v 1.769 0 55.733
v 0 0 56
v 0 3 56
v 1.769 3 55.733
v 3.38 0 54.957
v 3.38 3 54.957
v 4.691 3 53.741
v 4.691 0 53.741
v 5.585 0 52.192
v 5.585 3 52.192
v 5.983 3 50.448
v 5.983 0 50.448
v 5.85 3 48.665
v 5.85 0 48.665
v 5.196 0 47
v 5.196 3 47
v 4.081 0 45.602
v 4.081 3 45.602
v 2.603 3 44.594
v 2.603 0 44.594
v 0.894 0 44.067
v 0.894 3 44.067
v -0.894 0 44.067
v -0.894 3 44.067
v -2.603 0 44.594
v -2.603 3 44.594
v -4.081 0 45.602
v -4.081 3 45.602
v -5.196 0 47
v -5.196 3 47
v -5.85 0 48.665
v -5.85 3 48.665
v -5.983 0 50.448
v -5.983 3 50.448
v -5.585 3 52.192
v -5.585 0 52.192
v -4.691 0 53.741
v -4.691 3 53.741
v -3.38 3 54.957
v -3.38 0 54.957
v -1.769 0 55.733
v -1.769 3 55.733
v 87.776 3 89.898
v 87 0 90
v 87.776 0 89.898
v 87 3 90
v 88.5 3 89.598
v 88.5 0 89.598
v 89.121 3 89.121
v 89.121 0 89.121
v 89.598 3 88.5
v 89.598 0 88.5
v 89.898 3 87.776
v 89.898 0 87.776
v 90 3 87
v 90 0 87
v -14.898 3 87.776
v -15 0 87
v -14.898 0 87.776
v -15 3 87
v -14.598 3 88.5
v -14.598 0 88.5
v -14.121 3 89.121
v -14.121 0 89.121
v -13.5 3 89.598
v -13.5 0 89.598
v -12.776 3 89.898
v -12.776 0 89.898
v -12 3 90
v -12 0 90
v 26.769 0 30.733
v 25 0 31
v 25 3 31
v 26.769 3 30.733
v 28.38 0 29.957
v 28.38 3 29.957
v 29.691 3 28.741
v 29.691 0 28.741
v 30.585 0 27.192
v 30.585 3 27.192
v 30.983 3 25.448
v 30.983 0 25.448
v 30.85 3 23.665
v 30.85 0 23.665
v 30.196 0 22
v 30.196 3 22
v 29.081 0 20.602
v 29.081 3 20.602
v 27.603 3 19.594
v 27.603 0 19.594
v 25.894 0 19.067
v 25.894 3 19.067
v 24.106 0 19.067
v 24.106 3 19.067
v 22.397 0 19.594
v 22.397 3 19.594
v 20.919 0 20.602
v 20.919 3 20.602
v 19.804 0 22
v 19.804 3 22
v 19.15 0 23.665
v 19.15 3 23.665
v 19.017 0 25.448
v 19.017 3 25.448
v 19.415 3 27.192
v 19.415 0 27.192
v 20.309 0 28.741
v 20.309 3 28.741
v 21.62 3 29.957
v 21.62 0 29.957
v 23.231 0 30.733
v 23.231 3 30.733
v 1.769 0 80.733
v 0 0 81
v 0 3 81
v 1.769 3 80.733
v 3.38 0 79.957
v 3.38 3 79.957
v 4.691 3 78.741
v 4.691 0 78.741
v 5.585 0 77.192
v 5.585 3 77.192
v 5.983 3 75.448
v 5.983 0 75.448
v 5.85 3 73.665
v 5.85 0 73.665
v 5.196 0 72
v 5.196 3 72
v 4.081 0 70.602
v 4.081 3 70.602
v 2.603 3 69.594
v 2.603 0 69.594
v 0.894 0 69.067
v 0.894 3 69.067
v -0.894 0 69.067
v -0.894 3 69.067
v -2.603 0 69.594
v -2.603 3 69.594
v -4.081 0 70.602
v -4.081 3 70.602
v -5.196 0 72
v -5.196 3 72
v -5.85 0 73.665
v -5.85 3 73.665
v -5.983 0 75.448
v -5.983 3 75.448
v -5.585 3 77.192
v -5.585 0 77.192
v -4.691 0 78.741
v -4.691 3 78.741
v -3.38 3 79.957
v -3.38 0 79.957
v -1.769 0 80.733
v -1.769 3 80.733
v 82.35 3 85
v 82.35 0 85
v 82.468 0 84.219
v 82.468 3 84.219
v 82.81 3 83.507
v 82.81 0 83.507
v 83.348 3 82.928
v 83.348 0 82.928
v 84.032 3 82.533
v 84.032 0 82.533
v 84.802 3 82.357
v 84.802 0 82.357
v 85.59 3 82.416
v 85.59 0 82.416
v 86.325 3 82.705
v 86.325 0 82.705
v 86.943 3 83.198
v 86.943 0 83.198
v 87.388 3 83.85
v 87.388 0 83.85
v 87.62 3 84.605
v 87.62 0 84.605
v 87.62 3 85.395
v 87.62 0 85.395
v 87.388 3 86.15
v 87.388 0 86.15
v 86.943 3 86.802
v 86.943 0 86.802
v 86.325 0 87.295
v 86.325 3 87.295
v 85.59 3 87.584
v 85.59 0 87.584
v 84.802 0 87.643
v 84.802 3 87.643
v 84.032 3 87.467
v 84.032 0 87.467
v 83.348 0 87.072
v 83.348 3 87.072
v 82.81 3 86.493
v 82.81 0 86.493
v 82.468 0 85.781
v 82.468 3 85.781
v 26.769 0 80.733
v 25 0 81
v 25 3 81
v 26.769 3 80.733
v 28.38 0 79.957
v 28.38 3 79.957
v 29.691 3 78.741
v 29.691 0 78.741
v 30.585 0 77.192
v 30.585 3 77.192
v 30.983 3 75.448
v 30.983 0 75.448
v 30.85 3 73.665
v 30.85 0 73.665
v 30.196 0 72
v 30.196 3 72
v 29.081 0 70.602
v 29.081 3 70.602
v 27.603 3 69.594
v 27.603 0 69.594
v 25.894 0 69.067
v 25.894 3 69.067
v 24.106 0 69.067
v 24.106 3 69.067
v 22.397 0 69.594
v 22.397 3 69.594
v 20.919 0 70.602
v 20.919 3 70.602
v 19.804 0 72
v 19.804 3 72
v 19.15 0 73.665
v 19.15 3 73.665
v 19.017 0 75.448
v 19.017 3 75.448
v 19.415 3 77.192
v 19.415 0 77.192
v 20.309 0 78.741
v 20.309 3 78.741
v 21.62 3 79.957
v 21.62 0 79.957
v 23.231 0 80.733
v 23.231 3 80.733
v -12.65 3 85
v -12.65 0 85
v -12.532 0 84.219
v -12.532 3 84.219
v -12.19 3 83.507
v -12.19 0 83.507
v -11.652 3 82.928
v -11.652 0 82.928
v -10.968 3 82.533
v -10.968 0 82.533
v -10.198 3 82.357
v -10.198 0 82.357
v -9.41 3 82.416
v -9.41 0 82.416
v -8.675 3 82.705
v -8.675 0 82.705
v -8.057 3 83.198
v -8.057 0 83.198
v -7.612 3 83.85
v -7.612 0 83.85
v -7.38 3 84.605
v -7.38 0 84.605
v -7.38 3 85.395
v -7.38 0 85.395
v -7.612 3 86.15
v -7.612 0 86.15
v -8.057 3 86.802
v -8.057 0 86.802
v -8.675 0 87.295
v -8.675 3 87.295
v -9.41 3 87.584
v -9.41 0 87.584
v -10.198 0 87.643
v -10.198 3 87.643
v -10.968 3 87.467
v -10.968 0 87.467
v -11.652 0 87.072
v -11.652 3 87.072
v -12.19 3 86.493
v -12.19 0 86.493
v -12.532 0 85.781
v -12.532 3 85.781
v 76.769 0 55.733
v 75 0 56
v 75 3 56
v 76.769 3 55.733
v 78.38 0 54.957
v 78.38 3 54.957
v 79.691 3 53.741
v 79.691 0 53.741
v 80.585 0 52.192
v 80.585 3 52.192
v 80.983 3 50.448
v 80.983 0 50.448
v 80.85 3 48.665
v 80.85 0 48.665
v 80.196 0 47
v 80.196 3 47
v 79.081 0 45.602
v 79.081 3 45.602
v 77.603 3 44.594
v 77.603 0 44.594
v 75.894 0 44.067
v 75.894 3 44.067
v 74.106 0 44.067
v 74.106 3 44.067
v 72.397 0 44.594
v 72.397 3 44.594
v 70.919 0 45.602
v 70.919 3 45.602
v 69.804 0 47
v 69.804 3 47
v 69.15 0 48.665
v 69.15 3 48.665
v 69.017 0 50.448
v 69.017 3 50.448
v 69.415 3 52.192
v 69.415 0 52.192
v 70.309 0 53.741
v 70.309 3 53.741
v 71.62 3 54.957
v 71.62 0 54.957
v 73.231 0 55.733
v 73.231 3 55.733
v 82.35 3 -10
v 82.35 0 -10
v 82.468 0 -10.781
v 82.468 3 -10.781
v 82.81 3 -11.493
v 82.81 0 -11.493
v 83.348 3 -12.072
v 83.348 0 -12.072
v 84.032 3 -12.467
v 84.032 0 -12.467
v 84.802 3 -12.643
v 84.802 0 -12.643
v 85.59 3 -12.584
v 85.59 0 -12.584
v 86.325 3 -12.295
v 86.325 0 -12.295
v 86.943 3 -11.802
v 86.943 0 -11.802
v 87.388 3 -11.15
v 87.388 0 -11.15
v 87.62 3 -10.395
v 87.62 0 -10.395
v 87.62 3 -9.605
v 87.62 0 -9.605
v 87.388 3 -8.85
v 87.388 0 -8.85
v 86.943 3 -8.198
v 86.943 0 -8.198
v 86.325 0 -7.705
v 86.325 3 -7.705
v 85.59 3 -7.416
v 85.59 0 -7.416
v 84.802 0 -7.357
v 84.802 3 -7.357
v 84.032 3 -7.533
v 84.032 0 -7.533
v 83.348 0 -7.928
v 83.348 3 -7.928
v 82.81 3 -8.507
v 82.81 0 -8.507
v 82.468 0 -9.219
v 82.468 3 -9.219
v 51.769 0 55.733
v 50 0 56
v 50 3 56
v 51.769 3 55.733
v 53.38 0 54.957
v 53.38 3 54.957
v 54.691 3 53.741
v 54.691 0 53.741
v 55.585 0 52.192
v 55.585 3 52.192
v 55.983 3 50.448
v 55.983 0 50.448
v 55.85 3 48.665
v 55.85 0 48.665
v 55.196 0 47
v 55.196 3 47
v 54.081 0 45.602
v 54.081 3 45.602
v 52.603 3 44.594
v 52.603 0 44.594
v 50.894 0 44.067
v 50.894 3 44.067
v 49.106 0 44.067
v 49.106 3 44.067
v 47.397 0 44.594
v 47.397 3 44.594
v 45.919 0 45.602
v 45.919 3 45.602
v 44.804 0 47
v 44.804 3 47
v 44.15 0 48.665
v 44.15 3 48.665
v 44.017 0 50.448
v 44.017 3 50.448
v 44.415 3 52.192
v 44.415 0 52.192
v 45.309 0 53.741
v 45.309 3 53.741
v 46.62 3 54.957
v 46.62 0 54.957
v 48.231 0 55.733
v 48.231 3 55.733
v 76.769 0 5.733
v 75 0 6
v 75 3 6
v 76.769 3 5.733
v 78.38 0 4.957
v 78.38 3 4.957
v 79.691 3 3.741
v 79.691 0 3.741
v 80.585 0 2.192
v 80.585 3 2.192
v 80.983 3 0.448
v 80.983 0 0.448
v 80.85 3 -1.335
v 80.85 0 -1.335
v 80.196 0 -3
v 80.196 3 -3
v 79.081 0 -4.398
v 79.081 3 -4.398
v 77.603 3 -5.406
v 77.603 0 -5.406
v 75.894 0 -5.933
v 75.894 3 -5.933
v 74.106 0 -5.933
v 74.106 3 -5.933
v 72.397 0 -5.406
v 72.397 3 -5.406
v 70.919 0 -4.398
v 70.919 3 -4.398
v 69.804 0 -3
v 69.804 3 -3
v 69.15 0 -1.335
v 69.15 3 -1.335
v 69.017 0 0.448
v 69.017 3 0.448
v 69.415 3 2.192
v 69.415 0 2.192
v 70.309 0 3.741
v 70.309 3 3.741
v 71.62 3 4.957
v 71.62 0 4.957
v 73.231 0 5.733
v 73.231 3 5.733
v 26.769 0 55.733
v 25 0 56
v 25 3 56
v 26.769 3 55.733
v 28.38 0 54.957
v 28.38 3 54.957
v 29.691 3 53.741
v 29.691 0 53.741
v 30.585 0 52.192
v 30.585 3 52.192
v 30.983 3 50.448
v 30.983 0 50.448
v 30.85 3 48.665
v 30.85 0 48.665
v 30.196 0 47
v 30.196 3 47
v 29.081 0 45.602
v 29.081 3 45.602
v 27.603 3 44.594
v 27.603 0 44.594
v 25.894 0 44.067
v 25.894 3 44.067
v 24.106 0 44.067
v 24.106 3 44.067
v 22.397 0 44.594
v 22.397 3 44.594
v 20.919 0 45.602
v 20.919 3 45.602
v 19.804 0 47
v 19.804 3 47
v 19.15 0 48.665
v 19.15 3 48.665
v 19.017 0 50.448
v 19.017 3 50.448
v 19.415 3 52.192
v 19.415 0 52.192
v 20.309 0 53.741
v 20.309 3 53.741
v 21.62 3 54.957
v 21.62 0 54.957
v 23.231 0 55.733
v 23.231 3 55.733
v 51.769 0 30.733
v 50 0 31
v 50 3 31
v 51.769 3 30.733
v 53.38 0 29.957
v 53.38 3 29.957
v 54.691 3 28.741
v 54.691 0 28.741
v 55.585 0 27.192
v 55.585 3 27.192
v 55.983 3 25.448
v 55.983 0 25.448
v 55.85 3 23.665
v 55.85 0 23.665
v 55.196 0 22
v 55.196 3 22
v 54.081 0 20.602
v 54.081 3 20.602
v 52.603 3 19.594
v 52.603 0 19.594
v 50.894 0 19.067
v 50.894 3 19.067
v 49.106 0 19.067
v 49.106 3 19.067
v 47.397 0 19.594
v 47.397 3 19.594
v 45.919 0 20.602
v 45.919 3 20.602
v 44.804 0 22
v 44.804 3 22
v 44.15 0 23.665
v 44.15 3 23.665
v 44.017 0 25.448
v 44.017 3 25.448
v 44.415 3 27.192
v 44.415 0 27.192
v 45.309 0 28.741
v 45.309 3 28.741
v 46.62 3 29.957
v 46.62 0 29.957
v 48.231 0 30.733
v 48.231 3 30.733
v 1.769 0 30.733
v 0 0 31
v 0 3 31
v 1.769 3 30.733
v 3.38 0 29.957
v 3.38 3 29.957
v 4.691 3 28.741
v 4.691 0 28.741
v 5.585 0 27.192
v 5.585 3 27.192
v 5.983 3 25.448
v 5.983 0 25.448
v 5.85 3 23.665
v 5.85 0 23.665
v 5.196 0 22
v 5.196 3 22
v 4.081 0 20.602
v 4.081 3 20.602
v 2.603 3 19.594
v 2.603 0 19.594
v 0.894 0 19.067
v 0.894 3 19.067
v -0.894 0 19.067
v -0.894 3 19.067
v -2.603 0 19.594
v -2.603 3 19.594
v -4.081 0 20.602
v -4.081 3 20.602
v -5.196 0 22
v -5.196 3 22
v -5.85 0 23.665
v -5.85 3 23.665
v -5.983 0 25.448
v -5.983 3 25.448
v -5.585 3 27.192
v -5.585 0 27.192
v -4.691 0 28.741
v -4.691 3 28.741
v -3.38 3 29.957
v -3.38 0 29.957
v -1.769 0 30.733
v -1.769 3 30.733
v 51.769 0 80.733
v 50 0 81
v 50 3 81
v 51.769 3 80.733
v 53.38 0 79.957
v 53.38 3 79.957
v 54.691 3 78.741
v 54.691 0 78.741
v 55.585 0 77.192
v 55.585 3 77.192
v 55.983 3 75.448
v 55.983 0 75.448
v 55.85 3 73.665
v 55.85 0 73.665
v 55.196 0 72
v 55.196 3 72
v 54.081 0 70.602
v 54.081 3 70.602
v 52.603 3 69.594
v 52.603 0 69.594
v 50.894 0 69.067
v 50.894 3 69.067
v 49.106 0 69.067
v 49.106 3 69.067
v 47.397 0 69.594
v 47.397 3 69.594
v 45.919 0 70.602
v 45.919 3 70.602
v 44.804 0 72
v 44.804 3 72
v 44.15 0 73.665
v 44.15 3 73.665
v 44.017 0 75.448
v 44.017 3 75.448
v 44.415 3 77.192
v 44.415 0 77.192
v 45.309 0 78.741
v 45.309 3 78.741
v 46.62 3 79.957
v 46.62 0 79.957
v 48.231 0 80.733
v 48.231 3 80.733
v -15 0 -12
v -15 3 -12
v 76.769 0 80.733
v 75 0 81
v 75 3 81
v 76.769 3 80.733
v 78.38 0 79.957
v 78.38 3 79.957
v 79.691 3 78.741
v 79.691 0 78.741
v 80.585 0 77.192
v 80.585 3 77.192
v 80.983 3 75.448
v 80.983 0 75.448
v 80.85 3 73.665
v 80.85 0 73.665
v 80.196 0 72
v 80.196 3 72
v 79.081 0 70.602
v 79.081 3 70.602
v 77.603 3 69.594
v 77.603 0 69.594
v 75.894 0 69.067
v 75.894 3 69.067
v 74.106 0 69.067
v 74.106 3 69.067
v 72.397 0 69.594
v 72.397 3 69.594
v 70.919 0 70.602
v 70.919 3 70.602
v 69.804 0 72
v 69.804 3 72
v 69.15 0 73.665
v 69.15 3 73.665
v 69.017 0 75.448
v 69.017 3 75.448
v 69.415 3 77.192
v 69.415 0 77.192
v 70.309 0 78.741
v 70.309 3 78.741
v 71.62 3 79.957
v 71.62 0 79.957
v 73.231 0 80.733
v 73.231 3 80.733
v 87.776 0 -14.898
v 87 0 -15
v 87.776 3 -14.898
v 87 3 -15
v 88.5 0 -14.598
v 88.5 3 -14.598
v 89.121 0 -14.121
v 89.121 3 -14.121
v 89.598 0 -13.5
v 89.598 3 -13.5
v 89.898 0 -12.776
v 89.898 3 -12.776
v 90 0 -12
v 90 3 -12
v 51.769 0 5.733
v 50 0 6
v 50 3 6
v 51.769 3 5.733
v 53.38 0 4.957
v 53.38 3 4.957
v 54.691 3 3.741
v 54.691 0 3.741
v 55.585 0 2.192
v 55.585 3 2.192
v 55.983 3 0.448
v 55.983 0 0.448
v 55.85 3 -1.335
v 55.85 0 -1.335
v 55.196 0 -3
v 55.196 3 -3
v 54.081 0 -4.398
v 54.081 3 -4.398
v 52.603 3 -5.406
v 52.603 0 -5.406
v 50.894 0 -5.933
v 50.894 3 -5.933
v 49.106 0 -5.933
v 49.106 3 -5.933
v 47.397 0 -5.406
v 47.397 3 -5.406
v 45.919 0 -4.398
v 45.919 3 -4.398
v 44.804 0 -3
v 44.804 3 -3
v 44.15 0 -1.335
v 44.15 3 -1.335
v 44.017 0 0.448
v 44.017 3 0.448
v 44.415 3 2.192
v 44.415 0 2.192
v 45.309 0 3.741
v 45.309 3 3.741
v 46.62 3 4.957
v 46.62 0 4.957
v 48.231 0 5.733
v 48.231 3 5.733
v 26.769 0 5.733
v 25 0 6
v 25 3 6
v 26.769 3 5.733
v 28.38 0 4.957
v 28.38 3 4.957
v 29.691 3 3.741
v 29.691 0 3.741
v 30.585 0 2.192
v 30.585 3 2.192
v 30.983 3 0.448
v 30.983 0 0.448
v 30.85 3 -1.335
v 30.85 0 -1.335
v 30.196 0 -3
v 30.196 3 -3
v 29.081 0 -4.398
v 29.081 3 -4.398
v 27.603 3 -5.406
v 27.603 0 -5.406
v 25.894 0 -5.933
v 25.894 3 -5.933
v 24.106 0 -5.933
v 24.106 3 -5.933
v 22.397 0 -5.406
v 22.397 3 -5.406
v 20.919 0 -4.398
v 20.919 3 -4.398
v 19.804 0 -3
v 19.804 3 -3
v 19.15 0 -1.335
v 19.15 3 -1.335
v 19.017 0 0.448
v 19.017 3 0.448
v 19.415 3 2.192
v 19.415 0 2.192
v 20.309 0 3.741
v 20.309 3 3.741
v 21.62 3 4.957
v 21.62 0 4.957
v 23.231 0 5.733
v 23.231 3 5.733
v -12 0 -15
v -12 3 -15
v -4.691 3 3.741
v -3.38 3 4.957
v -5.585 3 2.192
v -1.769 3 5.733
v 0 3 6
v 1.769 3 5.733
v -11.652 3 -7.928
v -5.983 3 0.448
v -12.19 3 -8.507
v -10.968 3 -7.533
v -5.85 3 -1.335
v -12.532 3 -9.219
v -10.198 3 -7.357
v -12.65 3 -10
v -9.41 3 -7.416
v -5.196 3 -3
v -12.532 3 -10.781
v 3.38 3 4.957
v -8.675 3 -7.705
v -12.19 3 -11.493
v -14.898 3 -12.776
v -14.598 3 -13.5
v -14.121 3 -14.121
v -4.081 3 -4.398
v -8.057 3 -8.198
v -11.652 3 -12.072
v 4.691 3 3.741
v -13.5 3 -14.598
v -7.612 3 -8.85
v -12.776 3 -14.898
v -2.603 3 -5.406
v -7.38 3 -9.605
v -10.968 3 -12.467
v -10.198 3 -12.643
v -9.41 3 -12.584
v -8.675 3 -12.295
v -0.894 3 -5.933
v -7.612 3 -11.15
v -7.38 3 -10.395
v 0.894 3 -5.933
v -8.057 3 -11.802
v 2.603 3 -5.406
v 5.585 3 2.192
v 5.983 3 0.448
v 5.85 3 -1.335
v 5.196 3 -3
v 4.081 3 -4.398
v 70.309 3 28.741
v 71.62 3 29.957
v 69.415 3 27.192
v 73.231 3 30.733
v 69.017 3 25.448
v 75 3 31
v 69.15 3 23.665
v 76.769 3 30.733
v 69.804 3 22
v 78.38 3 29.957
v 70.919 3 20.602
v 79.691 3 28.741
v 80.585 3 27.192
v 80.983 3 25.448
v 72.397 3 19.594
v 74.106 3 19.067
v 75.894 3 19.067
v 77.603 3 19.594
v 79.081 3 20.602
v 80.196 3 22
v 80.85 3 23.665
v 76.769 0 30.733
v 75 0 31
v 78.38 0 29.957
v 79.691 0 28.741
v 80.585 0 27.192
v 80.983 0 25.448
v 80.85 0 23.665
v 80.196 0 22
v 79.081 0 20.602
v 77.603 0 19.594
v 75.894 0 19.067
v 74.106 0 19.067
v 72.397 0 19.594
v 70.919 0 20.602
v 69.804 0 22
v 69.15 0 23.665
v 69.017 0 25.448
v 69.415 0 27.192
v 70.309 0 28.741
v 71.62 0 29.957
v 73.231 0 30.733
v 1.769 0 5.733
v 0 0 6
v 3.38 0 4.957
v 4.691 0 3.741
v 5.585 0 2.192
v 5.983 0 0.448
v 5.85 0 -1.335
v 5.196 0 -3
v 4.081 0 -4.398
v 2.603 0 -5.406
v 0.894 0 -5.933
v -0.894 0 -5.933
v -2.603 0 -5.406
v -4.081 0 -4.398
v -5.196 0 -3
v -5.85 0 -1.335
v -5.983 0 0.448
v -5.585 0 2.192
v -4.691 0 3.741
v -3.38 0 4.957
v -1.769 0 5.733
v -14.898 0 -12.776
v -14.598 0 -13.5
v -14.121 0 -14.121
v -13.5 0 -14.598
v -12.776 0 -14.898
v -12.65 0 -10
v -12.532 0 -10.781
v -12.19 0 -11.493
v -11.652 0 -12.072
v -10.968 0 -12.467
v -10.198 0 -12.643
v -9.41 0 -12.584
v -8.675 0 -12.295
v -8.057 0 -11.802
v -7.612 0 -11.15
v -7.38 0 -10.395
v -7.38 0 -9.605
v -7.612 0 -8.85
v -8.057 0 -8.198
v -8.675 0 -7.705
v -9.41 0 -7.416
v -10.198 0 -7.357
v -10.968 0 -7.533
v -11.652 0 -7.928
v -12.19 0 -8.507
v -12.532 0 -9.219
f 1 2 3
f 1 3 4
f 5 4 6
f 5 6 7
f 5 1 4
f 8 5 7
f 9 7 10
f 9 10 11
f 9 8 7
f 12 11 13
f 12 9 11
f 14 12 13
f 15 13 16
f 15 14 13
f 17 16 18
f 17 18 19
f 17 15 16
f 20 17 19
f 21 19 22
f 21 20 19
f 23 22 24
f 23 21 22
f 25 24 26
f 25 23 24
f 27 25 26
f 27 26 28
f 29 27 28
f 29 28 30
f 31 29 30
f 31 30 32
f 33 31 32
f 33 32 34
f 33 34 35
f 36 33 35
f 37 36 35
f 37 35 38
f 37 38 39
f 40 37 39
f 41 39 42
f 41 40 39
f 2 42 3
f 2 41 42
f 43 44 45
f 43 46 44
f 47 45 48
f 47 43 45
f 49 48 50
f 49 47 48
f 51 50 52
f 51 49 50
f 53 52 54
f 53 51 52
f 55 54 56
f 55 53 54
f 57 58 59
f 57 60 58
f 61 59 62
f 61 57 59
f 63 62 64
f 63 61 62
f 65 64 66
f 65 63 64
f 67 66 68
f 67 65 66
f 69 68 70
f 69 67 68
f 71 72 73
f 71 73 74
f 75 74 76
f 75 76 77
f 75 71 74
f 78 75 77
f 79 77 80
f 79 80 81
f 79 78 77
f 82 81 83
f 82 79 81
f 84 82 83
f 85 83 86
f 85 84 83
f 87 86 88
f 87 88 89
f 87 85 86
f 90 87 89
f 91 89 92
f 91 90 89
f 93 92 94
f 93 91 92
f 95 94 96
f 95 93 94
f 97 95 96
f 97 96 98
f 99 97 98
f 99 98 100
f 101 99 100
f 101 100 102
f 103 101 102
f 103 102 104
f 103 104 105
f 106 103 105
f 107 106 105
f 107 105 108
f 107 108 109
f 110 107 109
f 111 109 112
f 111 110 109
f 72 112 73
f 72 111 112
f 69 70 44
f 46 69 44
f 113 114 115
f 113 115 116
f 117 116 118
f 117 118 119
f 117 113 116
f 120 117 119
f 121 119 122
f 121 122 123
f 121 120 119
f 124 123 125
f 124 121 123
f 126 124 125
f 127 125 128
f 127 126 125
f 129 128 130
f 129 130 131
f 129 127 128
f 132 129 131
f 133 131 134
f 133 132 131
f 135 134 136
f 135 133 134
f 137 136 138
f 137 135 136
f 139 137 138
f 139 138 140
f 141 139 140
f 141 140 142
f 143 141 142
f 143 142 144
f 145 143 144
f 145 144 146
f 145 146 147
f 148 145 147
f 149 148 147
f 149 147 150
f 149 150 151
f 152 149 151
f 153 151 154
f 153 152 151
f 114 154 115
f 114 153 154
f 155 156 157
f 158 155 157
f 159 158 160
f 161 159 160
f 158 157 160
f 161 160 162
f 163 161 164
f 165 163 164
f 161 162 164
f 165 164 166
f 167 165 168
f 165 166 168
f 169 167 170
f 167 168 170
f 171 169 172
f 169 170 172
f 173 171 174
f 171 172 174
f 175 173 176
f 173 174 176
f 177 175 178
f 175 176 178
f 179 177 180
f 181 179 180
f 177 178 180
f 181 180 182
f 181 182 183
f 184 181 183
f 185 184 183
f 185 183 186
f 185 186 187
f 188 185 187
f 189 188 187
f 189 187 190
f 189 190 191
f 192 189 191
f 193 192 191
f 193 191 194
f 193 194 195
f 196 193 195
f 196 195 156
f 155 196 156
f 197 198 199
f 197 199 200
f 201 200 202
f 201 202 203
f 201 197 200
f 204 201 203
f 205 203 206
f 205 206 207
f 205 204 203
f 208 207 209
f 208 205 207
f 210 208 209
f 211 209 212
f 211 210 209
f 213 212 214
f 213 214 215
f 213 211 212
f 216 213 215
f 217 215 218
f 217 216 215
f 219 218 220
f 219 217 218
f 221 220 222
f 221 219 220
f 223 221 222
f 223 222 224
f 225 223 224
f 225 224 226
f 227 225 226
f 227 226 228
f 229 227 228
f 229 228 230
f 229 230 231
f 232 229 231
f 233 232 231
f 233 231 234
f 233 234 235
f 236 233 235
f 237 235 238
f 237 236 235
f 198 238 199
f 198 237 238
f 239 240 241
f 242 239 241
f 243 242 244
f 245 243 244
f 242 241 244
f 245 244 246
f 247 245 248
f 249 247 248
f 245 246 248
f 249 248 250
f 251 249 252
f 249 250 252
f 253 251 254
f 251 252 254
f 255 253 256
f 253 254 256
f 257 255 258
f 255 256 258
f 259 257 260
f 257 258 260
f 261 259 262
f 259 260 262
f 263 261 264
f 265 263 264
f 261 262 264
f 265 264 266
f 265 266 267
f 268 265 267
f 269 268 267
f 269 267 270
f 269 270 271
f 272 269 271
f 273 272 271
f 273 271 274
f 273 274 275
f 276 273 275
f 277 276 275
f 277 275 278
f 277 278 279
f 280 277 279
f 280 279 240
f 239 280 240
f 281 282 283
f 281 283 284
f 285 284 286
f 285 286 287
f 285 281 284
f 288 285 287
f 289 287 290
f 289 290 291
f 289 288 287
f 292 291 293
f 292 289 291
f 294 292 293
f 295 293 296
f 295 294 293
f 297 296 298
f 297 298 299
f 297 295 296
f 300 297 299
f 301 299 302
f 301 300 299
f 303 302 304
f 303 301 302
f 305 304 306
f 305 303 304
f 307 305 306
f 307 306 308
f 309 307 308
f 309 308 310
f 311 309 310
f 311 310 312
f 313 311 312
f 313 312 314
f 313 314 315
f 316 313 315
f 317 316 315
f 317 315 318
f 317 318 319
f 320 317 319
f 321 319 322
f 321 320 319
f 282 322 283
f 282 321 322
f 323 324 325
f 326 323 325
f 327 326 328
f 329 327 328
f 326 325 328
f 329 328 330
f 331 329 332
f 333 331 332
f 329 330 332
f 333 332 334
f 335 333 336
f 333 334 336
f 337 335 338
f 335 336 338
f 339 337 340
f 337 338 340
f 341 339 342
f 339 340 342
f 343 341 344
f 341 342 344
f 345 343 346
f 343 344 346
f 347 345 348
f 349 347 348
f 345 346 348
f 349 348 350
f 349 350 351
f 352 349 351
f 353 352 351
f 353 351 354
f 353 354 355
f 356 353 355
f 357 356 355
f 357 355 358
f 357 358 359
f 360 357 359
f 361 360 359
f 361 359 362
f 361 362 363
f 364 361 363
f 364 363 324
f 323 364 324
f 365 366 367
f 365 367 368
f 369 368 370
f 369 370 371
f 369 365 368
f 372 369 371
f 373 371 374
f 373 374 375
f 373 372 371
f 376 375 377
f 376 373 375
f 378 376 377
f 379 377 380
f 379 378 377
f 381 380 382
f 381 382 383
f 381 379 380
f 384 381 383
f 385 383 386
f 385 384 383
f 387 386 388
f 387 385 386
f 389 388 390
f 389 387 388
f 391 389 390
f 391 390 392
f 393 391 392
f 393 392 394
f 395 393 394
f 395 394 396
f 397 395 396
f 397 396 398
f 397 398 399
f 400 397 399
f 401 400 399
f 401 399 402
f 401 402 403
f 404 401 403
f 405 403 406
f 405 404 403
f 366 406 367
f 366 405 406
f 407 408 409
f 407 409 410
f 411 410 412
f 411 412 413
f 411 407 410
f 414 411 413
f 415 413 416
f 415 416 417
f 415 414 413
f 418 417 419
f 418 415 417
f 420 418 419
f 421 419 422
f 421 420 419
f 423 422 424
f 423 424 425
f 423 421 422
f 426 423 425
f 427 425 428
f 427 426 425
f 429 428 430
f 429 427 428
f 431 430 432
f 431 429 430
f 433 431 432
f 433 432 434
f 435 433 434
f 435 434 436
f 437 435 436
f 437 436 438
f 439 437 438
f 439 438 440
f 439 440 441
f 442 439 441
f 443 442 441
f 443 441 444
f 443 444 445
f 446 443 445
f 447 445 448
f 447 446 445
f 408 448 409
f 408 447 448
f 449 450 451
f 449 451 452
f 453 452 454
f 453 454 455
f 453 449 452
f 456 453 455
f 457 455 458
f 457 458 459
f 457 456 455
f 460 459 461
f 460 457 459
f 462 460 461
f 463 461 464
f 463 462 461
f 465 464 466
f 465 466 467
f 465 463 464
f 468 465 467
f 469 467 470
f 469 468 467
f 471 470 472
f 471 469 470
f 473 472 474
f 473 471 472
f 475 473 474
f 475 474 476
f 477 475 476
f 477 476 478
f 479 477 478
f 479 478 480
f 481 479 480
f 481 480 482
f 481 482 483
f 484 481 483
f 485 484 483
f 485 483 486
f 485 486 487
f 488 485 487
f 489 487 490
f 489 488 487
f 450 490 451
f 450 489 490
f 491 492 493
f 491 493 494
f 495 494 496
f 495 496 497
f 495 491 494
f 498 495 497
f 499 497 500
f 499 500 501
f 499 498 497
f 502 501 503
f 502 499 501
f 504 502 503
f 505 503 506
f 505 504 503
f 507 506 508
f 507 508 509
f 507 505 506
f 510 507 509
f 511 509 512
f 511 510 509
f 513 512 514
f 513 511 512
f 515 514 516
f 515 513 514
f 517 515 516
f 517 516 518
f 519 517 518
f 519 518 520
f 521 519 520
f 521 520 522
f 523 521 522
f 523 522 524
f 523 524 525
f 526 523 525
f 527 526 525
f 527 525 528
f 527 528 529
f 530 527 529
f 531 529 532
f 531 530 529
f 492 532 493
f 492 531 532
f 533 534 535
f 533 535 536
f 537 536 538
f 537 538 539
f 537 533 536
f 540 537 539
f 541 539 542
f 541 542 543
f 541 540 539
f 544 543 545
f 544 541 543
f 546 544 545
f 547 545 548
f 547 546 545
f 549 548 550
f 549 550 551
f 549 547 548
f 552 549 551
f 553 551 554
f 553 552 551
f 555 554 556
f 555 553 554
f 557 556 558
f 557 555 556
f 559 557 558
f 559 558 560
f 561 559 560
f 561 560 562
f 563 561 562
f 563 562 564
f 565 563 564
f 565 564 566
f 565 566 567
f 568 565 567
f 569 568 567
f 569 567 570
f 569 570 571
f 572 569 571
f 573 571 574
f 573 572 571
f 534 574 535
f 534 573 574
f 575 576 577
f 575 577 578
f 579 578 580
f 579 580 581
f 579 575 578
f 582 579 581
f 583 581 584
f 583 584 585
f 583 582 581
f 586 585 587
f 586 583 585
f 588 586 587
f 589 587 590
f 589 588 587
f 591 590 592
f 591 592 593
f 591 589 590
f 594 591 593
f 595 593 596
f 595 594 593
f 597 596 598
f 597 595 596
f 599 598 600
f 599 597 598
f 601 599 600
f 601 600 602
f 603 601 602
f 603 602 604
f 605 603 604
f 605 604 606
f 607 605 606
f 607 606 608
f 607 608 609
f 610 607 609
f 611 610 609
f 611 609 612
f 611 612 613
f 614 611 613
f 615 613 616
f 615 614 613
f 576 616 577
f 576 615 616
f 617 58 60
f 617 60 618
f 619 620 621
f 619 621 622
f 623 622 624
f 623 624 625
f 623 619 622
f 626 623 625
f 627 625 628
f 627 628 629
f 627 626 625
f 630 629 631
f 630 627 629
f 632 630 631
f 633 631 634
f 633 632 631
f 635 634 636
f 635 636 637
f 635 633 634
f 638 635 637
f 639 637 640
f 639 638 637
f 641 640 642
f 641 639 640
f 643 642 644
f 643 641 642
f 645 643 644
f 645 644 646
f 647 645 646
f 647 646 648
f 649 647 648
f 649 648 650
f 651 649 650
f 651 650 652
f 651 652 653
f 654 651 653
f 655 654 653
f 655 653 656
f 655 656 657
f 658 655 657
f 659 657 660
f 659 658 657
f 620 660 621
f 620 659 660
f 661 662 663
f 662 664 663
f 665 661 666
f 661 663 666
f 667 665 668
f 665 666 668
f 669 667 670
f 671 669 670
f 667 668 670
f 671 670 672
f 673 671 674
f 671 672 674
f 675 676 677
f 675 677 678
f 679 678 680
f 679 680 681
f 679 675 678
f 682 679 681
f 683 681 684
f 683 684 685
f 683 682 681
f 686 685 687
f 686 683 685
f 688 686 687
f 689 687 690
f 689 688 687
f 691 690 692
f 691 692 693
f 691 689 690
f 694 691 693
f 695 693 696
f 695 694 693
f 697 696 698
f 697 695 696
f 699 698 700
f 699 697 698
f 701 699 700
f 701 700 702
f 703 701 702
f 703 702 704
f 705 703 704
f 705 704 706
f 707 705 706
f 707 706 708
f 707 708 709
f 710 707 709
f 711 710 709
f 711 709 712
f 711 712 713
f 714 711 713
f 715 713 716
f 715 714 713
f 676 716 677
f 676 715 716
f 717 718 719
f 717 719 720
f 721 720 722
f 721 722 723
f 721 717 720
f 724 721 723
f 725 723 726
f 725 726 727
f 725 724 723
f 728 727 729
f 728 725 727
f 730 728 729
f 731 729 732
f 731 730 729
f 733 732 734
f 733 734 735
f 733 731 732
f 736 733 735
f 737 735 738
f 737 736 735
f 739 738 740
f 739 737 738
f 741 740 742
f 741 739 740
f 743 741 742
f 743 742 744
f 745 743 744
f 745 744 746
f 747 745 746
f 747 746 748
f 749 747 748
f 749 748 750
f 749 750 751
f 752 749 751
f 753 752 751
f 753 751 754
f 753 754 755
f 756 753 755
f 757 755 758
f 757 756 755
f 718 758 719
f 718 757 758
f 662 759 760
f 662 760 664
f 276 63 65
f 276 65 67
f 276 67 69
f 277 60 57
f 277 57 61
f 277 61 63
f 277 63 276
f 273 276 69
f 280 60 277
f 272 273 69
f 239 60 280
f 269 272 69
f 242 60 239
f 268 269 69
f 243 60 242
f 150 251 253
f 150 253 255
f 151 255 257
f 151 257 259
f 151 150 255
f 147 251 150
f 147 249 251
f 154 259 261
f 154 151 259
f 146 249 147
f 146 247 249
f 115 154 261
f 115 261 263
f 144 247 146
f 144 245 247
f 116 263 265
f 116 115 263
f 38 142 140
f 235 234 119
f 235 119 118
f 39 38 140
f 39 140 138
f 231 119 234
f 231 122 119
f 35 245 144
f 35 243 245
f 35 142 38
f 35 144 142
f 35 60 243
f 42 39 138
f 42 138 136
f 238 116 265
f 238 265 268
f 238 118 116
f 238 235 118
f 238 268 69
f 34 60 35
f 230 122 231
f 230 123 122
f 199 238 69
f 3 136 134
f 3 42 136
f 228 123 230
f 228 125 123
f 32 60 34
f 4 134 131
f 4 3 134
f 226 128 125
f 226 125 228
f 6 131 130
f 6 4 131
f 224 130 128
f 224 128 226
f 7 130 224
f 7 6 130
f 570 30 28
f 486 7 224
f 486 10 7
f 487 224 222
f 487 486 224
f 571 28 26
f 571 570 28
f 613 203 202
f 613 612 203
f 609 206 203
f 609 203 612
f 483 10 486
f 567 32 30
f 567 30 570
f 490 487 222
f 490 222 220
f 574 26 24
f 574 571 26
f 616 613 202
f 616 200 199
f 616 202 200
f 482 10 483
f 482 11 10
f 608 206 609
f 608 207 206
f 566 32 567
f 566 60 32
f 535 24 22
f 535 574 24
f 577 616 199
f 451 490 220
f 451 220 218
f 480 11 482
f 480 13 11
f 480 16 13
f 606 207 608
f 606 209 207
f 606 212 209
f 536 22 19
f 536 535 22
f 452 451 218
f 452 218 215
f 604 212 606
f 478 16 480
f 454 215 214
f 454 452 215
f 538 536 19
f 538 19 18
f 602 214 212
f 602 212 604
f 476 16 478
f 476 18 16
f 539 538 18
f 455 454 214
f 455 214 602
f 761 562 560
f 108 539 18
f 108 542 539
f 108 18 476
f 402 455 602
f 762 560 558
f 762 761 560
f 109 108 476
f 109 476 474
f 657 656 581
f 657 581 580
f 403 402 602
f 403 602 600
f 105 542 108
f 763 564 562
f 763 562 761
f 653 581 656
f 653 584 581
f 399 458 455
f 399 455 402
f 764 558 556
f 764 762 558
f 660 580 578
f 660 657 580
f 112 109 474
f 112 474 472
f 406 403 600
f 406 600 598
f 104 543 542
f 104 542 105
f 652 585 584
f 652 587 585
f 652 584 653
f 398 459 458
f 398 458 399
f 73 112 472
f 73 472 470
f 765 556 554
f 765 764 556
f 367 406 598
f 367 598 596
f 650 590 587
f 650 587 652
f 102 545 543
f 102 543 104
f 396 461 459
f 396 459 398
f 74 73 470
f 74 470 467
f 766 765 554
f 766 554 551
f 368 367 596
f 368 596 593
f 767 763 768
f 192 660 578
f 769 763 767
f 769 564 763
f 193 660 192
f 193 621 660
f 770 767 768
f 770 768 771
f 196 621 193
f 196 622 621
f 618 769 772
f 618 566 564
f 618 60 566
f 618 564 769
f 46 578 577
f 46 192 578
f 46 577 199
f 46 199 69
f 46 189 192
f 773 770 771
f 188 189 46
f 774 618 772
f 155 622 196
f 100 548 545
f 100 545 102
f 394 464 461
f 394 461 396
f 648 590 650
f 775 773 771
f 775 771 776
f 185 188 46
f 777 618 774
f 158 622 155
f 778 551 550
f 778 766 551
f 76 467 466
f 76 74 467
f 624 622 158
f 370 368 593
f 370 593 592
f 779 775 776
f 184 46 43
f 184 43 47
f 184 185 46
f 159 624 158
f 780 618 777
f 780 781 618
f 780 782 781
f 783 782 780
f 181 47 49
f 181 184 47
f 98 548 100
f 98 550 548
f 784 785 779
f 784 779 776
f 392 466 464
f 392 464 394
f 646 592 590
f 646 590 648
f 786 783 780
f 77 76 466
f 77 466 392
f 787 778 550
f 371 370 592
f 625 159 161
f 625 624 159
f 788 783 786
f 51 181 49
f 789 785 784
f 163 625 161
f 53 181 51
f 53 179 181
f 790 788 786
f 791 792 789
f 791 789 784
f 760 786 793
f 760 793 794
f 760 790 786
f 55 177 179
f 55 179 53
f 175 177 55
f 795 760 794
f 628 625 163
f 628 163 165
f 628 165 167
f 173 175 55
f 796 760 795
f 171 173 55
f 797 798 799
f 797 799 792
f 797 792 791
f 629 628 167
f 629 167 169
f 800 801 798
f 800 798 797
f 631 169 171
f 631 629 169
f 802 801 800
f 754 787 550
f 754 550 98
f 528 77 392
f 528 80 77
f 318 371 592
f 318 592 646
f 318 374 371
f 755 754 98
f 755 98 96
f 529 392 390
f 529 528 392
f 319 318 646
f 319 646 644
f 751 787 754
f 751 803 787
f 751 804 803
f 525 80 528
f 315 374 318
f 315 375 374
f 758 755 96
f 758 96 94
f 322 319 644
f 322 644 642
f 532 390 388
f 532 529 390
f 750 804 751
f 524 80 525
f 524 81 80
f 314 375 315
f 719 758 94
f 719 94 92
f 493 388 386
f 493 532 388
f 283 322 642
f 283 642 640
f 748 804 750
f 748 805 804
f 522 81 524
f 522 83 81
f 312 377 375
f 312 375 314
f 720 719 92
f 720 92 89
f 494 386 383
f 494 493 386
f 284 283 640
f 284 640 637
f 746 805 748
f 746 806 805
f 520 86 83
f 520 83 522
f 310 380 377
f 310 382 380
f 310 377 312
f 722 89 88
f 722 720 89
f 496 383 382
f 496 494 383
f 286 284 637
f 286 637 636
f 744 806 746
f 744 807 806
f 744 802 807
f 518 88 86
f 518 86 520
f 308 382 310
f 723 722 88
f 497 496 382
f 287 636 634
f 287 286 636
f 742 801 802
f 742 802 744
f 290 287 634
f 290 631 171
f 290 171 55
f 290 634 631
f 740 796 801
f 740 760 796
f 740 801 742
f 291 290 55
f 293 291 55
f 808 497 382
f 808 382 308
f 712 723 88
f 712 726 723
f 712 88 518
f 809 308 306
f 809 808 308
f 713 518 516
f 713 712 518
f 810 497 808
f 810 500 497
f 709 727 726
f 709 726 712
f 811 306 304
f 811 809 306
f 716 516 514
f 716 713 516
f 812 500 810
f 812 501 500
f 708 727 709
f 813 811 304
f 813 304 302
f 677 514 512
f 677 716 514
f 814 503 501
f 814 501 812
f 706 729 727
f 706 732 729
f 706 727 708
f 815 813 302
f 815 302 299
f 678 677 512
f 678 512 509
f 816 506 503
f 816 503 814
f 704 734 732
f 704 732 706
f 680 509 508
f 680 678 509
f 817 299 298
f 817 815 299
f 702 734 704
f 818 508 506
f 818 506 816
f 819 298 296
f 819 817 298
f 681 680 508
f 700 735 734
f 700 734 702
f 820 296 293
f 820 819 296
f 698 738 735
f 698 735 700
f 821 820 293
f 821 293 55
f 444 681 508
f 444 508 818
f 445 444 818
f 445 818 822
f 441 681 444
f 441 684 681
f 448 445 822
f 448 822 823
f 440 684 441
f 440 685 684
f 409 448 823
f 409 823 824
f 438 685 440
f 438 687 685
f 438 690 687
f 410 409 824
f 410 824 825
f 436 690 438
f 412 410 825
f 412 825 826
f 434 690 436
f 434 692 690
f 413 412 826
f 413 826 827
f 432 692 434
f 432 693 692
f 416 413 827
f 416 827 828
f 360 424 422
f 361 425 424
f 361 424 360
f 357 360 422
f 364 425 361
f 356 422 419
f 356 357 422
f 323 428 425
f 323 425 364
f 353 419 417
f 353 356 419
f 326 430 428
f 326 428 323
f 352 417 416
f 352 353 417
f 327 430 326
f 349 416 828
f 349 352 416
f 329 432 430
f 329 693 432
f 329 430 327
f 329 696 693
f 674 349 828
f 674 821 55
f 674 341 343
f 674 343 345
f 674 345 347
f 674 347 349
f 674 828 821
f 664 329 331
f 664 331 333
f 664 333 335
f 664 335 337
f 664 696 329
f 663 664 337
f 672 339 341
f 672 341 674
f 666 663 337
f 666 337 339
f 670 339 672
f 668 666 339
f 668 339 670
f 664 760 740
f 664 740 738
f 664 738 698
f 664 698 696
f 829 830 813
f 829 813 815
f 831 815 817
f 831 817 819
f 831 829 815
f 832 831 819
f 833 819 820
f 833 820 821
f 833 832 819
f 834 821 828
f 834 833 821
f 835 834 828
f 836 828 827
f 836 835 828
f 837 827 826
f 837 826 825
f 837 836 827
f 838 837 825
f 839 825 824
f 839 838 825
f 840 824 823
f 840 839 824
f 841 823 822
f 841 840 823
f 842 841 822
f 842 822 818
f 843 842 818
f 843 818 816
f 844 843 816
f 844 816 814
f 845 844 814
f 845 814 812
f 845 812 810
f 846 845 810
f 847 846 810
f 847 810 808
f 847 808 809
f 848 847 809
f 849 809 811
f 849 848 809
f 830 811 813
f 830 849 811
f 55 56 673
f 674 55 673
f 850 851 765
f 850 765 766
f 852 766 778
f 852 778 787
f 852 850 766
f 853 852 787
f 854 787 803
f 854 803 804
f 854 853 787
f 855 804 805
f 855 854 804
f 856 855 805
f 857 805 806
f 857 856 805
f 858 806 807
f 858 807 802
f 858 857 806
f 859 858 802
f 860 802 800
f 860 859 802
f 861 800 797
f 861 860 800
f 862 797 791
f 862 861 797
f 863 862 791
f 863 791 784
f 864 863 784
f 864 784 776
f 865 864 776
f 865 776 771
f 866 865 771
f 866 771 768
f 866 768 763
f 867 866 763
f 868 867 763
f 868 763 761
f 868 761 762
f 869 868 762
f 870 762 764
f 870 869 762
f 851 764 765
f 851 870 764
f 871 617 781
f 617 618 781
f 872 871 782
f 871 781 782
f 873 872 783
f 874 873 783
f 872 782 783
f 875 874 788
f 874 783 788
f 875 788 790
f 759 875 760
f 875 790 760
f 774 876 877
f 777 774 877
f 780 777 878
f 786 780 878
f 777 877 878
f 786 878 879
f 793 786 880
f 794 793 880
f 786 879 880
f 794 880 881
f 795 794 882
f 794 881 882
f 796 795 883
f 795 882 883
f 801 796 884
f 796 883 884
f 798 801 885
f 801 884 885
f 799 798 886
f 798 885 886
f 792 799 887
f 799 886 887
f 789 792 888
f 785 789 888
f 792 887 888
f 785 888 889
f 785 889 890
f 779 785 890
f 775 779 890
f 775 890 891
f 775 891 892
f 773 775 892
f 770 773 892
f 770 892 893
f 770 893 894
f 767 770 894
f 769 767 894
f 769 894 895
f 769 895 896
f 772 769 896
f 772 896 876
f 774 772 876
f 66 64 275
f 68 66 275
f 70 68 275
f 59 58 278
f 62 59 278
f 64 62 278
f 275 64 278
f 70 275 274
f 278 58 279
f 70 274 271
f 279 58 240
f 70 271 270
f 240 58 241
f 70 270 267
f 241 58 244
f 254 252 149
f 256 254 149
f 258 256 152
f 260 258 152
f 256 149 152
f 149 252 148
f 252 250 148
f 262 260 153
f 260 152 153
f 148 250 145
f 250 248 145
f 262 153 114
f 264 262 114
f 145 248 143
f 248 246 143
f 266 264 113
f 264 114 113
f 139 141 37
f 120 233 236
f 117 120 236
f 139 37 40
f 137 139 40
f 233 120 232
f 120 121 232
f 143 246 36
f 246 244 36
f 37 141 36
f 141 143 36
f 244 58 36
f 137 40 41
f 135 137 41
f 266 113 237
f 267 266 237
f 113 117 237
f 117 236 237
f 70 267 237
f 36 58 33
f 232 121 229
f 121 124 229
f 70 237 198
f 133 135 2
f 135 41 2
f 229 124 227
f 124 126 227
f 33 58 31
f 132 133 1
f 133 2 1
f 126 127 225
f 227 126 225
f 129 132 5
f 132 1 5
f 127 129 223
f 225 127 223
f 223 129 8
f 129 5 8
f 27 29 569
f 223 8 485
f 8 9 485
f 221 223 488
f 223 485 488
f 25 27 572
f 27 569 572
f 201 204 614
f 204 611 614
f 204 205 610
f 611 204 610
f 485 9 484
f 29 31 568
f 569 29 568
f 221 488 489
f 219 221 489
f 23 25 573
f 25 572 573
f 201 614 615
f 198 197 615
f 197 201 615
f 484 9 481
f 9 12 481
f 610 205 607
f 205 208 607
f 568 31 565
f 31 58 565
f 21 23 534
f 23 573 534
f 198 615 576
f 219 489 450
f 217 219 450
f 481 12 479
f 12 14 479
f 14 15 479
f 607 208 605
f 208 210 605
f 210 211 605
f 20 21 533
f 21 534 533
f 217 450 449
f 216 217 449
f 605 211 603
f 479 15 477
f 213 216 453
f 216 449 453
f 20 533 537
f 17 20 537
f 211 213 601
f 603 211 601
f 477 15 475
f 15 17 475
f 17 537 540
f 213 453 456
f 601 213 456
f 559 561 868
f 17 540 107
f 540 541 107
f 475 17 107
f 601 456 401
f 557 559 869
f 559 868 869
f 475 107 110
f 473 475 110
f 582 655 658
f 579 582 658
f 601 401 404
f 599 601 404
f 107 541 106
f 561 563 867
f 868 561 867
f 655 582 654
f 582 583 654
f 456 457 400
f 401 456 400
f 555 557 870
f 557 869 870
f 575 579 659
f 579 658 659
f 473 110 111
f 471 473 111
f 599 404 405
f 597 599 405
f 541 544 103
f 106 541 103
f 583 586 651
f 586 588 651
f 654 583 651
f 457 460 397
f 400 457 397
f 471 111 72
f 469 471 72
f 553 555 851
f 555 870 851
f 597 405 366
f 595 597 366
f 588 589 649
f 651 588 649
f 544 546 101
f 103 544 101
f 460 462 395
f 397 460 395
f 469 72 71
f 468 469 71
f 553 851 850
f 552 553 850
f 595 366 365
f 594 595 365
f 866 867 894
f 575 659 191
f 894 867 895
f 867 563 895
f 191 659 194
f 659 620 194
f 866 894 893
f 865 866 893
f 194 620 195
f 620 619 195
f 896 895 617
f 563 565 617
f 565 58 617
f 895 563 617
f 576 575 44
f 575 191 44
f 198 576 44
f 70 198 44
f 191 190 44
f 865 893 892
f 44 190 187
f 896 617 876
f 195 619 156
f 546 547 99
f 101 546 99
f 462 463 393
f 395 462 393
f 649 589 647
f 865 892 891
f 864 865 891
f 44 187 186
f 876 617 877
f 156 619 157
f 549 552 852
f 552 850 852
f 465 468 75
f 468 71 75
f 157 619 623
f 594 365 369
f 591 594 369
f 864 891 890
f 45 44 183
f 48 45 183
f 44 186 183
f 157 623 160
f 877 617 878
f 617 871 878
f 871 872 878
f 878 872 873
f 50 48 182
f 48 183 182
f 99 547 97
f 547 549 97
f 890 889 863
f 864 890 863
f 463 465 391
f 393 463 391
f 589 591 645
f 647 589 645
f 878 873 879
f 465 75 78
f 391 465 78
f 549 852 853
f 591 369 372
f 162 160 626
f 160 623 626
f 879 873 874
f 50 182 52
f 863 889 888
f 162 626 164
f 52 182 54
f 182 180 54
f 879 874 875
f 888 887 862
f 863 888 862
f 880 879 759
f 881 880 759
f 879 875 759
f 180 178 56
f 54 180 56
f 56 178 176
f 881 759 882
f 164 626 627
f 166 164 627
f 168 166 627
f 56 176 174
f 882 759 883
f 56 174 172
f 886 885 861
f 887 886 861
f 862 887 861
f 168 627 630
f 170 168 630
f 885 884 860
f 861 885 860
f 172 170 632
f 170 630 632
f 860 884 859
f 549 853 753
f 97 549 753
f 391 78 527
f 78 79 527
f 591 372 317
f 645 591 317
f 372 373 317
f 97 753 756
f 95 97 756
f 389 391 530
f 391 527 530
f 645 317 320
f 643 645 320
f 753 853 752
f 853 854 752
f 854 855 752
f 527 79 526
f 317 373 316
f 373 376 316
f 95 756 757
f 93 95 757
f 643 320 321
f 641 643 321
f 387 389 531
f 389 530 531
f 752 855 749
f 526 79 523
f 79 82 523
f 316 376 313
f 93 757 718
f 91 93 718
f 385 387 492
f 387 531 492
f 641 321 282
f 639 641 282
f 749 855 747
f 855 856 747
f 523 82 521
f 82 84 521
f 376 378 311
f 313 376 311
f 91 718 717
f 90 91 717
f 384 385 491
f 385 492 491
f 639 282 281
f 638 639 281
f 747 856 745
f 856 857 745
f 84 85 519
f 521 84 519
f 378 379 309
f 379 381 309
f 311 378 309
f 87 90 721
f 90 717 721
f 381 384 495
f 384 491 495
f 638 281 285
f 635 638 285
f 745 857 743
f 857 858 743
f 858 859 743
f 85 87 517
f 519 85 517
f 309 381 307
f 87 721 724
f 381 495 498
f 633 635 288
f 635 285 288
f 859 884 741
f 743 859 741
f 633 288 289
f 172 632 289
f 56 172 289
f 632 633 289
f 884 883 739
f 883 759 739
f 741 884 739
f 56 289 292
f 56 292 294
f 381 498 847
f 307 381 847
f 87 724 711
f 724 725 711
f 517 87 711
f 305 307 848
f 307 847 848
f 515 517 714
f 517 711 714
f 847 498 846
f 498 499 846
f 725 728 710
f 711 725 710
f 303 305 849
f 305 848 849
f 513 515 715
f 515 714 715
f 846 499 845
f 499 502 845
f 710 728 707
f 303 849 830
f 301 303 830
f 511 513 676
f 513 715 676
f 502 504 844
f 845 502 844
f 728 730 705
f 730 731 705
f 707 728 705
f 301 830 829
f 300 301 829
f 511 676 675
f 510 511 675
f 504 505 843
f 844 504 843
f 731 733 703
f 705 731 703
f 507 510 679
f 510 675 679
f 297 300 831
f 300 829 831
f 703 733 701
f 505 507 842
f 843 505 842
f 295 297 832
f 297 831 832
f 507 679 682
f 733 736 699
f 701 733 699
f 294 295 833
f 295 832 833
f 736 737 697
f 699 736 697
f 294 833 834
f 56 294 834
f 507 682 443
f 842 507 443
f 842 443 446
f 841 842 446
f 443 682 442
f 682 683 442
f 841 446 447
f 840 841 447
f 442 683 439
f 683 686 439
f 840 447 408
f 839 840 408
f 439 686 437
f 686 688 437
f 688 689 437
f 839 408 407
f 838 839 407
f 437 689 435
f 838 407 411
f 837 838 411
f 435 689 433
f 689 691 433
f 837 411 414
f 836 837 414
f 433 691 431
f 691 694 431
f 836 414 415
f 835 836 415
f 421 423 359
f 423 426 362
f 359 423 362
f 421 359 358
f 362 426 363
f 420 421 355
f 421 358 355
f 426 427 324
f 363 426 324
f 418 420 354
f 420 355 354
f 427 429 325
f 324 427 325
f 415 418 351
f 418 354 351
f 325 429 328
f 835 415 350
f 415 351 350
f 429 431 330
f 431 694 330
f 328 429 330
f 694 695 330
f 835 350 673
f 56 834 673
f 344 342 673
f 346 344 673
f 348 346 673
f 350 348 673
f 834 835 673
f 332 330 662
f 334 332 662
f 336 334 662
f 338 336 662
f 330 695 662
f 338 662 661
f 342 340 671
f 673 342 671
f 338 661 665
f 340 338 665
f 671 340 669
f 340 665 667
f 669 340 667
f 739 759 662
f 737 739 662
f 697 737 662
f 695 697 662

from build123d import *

# Parameters (mm, degrees)
SKETCH1_W            = 105
SKETCH1_H            = 105
SKETCH1_R            = 6
BOSS_EXTRUDE1_DEPTH  = 3
M5_CLEARANCE_HOLE1_D = 5.3
FILLET2_R            = 3


with BuildPart() as part:
    # Sketch1 → Boss-Extrude1 (new body)
    with BuildSketch(Plane(origin=(0, 0, 0), x_dir=(1, 0, 0), z_dir=(0, 1, 0))):
        with Locations((37.5, -37.5)):
            Rectangle(SKETCH1_W, SKETCH1_H)
        with Locations(Location((0, 0, 0), (0, 0, 270))):
            Circle(SKETCH1_R, mode=Mode.SUBTRACT)
        with Locations(Location((25, 0, 0), (0, 0, 270))):
            Circle(SKETCH1_R, mode=Mode.SUBTRACT)
        with Locations(Location((50, 0, 0), (0, 0, 270))):
            Circle(SKETCH1_R, mode=Mode.SUBTRACT)
        with Locations(Location((75, 0, 0), (0, 0, 270))):
            Circle(SKETCH1_R, mode=Mode.SUBTRACT)
        with Locations(Location((25, -25, 0), (0, 0, 270))):
            Circle(SKETCH1_R, mode=Mode.SUBTRACT)
        with Locations(Location((50, -25, 0), (0, 0, 270))):
            Circle(SKETCH1_R, mode=Mode.SUBTRACT)
        with Locations(Location((75, -25, 0), (0, 0, 270))):
            Circle(SKETCH1_R, mode=Mode.SUBTRACT)
        with Locations(Location((25, -50, 0), (0, 0, 270))):
            Circle(SKETCH1_R, mode=Mode.SUBTRACT)
        with Locations(Location((50, -50, 0), (0, 0, 270))):
            Circle(SKETCH1_R, mode=Mode.SUBTRACT)
        with Locations(Location((75, -50, 0), (0, 0, 270))):
            Circle(SKETCH1_R, mode=Mode.SUBTRACT)
        with Locations(Location((0, -25, 0), (0, 0, 270))):
            Circle(SKETCH1_R, mode=Mode.SUBTRACT)
        with Locations(Location((0, -50, 0), (0, 0, 270))):
            Circle(SKETCH1_R, mode=Mode.SUBTRACT)
        with Locations(Location((0, -75, 0), (0, 0, 270))):
            Circle(SKETCH1_R, mode=Mode.SUBTRACT)
        with Locations(Location((75, -75, 0), (0, 0, 270))):
            Circle(SKETCH1_R, mode=Mode.SUBTRACT)
        with Locations(Location((25, -75, 0), (0, 0, 270))):
            Circle(SKETCH1_R, mode=Mode.SUBTRACT)
        with Locations(Location((50, -75, 0), (0, 0, 270))):
            Circle(SKETCH1_R, mode=Mode.SUBTRACT)
    extrude(amount=BOSS_EXTRUDE1_DEPTH)

    # M5 Clearance Hole1 (through all)
    with Locations(Plane(origin=(0, 3, 0), x_dir=(1, 0, 0), z_dir=(0, 1, 0))):
        with Locations((-10, 10), (-10, -85), (85, -85), (85, 10)):
            Hole(M5_CLEARANCE_HOLE1_D / 2)

    # Fillet2
    fillet2_edges = [part.edges().sort_by_distance(p)[0] for p in [
        (-15, 1.5, -15),
        (90, 1.5, -15),
        (90, 1.5, 90),
        (-15, 1.5, 90),
    ]]
    fillet(fillet2_edges, radius=FILLET2_R)


solid = part.part
